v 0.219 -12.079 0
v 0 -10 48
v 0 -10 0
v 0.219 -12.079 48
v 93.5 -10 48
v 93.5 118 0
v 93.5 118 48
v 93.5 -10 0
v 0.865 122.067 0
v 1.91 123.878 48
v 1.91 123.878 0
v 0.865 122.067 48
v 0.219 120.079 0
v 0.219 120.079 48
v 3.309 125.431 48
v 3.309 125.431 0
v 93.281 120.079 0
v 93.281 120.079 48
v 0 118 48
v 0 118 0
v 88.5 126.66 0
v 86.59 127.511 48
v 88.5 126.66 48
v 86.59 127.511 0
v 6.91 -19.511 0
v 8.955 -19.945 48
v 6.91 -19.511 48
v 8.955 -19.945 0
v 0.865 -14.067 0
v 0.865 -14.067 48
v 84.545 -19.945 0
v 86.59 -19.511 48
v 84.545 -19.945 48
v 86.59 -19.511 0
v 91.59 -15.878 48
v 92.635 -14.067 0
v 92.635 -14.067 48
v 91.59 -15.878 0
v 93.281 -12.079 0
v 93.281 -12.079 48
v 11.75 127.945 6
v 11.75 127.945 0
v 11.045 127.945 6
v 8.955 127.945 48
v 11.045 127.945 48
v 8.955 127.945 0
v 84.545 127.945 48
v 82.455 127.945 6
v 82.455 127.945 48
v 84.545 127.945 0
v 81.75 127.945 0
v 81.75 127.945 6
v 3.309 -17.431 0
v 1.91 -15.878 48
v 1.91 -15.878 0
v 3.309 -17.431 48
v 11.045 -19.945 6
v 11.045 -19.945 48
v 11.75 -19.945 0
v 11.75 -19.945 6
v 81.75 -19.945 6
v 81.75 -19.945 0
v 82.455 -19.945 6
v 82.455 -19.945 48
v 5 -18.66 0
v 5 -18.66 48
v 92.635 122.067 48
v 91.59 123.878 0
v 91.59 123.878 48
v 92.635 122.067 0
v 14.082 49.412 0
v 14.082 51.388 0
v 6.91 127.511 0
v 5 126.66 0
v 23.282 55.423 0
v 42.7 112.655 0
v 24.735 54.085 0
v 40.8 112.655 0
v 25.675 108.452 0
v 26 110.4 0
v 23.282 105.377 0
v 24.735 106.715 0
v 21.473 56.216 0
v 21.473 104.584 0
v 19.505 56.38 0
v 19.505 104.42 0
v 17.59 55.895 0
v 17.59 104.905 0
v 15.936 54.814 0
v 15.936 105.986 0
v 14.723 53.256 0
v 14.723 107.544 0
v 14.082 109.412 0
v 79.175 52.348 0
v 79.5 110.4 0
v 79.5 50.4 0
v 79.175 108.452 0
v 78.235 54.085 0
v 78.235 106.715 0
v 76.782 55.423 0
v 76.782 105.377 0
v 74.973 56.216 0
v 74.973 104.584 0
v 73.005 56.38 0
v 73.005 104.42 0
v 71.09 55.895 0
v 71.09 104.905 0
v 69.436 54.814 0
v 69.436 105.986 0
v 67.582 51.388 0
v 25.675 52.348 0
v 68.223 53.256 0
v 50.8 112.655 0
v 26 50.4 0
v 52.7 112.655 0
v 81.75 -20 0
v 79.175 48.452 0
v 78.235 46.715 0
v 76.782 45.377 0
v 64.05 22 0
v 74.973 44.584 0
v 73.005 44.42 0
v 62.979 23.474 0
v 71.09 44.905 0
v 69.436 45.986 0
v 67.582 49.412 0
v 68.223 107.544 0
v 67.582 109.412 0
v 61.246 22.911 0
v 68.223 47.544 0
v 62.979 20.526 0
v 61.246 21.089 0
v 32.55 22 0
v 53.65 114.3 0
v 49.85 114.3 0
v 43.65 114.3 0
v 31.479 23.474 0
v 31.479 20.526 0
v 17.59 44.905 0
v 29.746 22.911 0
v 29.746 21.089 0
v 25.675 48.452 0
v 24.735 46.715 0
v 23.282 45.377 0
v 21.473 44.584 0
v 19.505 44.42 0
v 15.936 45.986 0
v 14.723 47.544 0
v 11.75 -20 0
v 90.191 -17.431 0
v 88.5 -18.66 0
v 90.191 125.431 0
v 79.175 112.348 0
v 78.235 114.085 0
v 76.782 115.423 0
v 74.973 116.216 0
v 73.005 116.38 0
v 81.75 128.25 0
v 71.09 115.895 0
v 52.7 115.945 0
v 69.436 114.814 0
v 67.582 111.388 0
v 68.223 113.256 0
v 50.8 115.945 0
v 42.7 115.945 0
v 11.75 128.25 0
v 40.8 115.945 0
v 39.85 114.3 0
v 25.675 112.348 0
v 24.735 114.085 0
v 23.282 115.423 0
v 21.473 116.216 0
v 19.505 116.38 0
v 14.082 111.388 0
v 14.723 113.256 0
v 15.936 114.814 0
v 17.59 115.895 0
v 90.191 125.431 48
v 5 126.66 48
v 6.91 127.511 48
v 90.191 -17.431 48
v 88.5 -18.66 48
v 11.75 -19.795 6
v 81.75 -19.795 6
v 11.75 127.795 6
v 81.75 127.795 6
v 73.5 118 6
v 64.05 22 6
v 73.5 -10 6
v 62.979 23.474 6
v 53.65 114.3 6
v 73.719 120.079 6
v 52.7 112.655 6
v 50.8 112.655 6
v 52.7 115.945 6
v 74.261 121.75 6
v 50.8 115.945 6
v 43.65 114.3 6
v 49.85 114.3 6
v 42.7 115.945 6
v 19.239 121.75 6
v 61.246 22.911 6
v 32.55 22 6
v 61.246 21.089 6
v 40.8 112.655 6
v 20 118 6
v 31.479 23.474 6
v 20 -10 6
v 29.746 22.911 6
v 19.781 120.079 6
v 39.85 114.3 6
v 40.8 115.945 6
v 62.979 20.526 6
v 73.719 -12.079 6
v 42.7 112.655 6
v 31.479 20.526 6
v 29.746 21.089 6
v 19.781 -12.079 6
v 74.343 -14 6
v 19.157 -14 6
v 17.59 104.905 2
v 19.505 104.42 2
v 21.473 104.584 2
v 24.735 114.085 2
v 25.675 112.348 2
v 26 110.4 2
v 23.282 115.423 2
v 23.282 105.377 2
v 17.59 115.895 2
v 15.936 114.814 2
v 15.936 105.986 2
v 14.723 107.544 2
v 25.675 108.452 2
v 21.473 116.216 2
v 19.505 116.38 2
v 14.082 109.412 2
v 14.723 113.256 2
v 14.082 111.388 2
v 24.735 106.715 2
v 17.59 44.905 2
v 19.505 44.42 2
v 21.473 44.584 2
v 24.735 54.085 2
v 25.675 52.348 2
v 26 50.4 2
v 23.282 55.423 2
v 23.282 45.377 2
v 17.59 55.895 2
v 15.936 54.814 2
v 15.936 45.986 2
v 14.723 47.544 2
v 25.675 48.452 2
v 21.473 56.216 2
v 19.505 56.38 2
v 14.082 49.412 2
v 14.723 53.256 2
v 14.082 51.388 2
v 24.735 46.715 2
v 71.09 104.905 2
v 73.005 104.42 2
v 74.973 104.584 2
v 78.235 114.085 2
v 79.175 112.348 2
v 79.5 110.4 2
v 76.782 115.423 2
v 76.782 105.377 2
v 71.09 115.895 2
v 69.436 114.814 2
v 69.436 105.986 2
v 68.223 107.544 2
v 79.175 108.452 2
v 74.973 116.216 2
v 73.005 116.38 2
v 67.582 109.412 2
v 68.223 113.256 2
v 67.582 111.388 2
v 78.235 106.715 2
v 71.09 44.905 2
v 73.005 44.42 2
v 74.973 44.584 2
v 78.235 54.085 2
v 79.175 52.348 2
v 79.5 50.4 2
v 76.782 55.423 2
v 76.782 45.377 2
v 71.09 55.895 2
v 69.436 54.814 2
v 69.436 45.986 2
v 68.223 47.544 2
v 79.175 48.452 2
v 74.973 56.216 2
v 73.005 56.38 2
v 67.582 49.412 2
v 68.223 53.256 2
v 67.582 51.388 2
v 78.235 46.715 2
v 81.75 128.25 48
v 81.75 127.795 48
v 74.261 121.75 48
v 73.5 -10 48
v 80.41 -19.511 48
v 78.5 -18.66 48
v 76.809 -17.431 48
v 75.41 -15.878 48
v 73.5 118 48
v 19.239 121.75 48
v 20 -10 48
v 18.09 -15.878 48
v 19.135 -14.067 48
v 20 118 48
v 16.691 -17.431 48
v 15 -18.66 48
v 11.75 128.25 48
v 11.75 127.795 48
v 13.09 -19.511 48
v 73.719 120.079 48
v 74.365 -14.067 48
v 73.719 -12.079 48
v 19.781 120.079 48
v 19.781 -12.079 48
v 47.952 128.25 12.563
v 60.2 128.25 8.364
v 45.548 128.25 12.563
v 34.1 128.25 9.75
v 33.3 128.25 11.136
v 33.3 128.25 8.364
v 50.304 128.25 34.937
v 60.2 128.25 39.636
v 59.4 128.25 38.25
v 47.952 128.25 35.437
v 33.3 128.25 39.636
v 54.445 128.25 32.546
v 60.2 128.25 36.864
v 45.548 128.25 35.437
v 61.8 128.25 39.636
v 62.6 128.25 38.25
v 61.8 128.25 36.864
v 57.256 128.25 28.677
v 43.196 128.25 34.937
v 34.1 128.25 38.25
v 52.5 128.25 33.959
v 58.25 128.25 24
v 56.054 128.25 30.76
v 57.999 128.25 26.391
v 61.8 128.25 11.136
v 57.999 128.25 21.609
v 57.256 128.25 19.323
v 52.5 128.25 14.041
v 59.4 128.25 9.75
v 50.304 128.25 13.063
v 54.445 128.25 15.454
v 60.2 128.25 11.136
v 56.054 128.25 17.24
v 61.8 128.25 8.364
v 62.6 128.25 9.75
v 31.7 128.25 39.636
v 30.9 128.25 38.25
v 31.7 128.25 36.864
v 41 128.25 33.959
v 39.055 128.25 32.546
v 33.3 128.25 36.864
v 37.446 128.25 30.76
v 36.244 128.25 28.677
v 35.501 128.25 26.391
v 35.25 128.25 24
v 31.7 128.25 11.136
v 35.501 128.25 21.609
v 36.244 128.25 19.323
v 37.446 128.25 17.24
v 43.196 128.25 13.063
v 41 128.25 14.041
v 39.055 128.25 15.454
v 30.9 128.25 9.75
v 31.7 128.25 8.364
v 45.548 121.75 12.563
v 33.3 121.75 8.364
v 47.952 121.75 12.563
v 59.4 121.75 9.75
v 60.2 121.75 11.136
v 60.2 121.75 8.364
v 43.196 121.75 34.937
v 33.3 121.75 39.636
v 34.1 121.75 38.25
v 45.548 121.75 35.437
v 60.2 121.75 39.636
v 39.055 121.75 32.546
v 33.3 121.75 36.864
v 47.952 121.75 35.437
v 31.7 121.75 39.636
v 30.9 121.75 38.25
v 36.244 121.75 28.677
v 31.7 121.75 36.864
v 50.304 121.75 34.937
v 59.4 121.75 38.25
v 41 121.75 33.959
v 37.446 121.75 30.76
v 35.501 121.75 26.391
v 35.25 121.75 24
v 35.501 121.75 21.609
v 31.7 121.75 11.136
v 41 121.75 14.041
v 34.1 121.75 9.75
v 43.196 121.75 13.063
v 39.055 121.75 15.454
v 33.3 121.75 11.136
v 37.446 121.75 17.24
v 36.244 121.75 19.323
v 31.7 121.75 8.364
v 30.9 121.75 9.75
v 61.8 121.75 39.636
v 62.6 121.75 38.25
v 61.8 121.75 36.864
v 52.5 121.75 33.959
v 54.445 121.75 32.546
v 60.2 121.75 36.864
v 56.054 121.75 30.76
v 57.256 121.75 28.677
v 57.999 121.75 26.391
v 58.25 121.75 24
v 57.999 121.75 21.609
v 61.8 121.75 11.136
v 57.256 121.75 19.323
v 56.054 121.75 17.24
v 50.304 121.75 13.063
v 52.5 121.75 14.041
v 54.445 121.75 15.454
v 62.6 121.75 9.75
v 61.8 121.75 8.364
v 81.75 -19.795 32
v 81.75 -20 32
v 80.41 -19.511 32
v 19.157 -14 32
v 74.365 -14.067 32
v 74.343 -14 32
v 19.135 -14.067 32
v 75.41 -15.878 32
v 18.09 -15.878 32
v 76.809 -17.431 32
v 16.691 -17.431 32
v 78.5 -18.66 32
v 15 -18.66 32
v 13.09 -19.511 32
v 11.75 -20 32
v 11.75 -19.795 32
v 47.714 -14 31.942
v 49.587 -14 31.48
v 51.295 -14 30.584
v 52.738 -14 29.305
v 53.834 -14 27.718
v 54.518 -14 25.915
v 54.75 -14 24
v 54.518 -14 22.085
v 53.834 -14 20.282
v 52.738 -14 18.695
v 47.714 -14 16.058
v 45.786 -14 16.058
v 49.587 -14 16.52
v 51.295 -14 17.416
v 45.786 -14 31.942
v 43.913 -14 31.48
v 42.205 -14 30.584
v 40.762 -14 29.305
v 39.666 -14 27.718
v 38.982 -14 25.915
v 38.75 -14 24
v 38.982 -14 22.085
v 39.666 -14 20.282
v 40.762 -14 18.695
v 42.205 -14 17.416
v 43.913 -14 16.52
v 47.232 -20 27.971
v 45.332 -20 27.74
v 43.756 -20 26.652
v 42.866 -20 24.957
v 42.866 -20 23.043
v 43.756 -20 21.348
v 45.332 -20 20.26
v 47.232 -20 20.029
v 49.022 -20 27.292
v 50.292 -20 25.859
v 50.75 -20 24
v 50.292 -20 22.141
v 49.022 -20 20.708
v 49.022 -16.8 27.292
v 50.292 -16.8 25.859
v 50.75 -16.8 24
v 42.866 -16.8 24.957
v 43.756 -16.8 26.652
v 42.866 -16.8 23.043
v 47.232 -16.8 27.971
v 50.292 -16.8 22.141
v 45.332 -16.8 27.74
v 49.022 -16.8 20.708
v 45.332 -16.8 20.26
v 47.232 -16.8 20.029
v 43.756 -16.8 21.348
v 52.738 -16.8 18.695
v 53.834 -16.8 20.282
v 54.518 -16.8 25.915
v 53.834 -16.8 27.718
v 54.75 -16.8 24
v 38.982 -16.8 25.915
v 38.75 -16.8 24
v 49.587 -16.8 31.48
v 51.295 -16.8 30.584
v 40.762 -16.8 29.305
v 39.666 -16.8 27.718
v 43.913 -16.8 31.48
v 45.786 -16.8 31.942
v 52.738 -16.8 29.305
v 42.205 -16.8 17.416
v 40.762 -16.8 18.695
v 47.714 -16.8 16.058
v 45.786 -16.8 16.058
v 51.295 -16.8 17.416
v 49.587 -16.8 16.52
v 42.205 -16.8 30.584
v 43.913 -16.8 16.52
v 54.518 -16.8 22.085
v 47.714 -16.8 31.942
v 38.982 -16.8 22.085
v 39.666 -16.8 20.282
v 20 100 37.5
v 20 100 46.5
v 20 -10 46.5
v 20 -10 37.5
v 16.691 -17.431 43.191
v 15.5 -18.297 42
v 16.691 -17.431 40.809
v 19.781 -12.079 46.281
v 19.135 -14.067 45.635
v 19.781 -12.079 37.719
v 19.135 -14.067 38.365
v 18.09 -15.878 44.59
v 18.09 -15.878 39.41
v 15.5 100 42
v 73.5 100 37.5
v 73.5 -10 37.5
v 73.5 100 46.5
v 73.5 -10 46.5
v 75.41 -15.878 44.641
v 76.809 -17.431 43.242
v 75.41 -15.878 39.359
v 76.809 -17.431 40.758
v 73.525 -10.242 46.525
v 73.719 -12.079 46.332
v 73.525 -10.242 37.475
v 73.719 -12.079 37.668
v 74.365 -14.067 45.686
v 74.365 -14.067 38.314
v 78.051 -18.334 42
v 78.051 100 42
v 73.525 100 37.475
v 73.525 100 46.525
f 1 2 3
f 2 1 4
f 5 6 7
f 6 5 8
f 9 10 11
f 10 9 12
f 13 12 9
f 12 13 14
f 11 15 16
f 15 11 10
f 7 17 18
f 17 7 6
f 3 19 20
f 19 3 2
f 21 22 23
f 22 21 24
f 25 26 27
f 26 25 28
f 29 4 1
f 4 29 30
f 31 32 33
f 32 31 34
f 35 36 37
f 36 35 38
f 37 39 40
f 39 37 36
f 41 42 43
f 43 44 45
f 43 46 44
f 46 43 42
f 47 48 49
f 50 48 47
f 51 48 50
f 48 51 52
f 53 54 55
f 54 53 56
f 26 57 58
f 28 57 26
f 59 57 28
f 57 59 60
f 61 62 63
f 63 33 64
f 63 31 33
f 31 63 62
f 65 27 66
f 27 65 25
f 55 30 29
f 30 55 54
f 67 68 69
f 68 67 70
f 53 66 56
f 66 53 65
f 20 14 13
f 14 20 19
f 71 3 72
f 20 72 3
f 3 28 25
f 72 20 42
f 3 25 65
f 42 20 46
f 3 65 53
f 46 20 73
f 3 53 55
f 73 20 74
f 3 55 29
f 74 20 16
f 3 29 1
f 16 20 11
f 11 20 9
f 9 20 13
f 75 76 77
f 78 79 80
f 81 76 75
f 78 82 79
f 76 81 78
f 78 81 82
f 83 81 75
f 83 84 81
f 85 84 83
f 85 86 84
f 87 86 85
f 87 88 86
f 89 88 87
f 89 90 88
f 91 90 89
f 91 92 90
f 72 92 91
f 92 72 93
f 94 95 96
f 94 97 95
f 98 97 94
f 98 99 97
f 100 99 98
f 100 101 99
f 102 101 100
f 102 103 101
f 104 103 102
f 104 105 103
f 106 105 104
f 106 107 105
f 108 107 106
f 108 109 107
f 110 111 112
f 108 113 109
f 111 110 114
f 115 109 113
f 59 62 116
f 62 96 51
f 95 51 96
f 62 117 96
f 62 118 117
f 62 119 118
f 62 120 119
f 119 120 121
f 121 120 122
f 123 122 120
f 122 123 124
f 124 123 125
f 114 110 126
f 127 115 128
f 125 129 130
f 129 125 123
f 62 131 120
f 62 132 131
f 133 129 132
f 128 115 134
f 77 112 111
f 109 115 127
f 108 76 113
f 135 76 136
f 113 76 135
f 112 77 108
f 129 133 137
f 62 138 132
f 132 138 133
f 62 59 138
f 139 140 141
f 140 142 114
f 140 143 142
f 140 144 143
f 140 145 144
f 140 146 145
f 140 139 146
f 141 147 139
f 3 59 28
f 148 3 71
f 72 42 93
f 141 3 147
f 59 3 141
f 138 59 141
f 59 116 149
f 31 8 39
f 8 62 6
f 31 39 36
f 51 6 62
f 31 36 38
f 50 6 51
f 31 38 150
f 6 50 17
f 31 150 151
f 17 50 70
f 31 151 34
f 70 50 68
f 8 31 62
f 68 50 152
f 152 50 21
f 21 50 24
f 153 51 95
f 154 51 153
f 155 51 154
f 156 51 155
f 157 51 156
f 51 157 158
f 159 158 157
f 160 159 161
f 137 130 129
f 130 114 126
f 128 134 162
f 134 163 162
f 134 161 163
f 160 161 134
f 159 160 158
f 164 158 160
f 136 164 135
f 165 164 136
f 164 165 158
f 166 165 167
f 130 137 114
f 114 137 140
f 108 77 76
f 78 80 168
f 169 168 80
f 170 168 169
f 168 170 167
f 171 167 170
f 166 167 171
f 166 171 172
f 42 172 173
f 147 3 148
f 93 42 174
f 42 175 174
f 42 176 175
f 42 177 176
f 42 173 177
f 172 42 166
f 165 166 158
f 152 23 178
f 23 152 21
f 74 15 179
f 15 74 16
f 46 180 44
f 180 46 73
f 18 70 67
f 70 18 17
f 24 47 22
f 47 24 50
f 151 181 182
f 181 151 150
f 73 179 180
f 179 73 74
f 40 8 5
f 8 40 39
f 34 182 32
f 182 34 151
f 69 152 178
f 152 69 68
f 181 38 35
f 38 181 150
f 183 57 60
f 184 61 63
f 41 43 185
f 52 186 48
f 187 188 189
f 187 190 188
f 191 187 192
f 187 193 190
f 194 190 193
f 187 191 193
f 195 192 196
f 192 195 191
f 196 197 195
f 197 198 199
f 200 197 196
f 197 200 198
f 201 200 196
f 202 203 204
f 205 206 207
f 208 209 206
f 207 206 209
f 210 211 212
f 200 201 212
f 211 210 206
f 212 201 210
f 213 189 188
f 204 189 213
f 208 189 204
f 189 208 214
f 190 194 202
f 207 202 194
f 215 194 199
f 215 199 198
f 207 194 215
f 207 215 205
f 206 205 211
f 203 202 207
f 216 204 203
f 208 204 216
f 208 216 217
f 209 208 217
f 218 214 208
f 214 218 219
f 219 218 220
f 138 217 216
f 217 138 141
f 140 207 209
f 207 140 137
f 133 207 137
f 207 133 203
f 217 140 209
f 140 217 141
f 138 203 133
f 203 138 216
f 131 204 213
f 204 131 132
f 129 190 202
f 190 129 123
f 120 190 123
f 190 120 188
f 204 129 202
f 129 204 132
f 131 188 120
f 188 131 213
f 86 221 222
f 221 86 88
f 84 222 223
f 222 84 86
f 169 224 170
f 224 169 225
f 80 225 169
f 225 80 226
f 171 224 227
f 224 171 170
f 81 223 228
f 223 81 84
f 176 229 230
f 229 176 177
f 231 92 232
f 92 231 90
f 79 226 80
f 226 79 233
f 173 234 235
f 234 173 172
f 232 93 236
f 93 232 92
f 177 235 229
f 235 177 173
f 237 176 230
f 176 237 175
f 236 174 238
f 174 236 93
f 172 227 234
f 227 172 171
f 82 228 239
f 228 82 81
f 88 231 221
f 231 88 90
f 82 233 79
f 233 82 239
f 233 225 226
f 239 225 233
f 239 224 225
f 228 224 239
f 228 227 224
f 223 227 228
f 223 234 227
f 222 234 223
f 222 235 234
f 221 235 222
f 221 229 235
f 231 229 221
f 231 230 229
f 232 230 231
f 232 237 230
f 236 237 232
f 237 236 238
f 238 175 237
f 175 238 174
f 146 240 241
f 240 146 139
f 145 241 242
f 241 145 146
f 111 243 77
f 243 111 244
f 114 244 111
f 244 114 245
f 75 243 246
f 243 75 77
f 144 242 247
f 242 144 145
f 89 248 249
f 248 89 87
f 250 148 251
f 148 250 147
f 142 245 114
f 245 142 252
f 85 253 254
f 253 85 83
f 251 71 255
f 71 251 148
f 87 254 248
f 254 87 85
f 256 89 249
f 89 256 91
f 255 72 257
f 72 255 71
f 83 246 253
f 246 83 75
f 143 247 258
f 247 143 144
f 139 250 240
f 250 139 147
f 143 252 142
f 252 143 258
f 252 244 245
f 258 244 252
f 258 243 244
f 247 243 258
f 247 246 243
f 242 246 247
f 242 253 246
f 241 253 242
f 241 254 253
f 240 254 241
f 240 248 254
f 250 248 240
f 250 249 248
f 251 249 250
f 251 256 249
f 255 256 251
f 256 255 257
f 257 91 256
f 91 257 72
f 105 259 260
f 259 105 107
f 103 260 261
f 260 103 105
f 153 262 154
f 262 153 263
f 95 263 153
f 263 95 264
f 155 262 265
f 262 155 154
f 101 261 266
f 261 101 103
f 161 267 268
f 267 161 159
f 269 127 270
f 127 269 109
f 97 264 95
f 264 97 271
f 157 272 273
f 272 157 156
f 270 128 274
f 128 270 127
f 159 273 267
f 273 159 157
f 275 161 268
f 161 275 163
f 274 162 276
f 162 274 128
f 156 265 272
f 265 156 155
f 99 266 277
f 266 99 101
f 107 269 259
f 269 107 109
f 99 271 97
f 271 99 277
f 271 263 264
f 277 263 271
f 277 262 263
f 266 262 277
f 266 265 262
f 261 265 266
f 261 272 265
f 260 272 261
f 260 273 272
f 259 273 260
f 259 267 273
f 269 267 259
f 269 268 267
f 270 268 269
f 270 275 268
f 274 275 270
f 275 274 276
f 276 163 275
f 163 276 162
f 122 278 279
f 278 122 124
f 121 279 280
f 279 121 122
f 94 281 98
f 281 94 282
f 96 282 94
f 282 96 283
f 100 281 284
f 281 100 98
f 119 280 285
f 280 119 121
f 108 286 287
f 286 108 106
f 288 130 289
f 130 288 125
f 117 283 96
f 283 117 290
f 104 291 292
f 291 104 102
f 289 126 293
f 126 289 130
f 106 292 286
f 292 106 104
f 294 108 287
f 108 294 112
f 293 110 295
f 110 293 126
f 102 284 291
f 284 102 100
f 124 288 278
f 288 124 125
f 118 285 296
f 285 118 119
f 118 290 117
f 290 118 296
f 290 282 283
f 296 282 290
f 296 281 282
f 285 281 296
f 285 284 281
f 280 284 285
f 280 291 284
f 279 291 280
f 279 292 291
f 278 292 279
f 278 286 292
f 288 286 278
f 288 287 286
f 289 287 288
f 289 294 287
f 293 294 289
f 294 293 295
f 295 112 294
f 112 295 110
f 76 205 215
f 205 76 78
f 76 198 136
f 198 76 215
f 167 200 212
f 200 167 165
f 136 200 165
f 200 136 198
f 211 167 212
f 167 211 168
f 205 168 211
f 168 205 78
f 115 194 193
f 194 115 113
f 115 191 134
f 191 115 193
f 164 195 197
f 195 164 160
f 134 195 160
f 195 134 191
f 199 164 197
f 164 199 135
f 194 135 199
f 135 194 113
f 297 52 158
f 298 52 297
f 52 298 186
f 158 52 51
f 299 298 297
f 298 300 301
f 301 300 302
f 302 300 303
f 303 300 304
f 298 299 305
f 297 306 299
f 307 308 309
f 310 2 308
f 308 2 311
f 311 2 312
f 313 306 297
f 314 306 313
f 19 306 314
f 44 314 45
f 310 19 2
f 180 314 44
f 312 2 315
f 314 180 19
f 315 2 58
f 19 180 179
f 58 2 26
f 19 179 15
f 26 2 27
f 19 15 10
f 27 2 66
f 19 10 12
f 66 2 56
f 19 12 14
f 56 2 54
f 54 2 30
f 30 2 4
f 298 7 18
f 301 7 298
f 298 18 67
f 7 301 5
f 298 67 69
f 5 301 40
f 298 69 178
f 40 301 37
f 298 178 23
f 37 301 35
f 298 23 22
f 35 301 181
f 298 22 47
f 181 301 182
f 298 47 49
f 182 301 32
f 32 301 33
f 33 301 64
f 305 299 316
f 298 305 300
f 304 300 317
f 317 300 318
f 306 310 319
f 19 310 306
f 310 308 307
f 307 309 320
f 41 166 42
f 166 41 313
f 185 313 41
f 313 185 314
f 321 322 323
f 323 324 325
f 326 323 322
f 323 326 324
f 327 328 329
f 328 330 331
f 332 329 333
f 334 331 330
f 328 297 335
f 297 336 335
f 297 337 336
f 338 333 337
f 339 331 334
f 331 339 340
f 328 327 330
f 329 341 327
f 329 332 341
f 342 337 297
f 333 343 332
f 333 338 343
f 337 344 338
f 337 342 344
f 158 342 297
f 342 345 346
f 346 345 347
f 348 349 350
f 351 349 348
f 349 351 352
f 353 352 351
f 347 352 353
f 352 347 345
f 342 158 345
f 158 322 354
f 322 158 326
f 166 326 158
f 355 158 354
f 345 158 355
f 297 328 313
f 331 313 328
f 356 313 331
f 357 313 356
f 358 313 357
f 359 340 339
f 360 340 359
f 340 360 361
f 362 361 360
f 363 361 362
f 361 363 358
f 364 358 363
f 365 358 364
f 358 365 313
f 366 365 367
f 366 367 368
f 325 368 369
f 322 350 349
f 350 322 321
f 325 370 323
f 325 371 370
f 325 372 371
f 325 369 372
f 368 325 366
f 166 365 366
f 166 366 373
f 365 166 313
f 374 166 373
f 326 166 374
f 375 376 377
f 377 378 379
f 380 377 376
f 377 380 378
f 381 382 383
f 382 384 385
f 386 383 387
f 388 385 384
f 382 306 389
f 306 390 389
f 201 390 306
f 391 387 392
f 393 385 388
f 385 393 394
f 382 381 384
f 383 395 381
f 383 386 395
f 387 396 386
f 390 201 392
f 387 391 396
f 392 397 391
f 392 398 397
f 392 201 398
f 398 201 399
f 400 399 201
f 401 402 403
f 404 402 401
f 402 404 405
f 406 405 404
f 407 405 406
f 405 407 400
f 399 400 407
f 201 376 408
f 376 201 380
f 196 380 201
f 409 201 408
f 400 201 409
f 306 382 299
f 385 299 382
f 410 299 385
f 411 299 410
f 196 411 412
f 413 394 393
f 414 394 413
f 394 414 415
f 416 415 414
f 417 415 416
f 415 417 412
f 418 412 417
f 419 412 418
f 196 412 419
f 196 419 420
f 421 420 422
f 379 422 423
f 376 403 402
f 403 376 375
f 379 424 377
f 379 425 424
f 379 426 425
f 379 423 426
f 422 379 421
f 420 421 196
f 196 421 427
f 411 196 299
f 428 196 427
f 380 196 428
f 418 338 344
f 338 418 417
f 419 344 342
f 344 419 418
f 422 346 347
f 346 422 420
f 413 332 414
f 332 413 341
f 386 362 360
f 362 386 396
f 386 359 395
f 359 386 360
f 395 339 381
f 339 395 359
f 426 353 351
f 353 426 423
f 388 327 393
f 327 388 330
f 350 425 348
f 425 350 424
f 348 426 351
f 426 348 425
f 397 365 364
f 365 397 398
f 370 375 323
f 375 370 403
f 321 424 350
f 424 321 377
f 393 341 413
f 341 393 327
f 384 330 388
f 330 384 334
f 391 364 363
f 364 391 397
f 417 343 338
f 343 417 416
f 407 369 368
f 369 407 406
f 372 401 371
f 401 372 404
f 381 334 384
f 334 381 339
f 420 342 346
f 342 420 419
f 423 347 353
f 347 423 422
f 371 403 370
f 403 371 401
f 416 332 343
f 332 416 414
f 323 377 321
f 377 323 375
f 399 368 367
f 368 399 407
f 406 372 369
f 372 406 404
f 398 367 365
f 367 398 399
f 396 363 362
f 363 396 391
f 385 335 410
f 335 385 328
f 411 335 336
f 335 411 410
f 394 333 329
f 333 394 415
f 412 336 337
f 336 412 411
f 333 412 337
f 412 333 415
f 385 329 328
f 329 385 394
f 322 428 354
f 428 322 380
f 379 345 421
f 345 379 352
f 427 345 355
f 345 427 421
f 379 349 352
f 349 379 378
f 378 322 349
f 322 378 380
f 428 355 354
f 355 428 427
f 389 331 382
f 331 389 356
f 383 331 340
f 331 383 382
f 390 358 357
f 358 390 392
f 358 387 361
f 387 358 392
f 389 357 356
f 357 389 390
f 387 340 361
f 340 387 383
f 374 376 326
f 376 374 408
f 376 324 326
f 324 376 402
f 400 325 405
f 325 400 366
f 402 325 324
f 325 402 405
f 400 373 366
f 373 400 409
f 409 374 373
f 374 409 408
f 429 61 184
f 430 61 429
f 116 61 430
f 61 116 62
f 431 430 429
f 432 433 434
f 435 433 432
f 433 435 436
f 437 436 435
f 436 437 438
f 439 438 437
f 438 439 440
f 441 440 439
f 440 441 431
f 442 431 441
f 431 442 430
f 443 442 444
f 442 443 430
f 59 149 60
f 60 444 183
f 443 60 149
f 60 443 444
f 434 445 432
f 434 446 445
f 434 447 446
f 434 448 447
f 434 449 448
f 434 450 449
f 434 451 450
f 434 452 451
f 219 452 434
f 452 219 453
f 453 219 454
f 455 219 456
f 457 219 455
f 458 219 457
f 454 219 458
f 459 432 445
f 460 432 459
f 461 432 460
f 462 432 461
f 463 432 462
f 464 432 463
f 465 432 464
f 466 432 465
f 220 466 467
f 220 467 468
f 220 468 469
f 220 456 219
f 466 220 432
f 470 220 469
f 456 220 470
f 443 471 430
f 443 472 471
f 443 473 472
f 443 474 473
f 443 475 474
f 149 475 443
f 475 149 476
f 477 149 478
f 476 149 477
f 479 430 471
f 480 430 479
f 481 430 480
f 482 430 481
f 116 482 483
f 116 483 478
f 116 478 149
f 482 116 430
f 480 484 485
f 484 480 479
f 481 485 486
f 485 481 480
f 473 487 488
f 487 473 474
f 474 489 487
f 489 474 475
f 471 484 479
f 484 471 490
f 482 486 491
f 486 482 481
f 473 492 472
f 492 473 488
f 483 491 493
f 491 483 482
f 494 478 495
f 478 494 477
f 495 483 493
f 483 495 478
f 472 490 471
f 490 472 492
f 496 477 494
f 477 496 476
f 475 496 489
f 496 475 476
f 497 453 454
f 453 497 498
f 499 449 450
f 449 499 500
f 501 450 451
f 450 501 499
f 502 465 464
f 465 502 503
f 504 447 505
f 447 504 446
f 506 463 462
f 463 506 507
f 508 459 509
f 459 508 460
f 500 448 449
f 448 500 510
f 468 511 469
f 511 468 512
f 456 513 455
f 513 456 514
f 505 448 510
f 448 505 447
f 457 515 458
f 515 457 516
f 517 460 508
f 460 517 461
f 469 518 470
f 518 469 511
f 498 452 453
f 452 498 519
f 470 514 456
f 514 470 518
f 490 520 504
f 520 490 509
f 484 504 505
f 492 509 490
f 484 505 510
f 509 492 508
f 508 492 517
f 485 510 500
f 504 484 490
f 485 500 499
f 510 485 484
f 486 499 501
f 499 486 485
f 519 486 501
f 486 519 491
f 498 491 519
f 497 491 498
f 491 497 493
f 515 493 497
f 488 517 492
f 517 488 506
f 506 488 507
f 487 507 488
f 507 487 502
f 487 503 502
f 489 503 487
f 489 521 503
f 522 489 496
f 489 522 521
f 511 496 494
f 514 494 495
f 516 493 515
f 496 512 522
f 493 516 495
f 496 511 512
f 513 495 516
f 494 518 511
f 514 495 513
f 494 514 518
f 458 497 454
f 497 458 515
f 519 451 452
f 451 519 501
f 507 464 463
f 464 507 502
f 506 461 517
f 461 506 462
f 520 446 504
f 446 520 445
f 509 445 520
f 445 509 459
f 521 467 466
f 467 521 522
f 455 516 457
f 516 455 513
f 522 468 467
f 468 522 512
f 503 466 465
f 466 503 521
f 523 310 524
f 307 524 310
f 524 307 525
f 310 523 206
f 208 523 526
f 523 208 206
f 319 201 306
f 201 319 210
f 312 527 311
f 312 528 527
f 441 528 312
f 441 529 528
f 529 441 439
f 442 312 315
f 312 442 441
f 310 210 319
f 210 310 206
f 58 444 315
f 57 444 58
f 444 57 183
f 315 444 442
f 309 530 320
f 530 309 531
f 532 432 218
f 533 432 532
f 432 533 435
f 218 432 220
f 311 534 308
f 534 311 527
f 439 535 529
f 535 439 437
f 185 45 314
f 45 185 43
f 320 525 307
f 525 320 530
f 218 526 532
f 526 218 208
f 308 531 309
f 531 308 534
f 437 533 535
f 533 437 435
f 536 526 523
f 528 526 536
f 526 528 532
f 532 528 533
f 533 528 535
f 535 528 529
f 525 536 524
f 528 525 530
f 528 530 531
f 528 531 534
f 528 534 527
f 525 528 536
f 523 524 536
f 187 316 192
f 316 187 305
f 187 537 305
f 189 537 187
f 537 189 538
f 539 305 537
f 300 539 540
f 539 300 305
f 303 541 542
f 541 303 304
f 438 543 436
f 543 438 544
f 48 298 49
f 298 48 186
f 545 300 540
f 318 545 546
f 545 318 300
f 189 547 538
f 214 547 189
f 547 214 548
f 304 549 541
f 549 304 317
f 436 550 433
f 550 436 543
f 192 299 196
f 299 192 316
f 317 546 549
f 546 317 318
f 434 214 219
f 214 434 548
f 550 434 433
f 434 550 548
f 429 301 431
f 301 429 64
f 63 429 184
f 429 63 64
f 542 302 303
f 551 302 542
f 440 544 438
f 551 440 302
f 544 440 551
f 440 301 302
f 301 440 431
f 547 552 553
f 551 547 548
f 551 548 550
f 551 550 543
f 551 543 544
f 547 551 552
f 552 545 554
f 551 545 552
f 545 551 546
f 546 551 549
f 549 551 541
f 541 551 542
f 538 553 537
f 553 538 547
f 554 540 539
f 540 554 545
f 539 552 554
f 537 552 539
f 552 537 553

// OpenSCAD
module roundedcube(x,y,z,r){
 hull(){
  translate([r/2,r/2,0]) cylinder(h=z,d=r);
  translate([-(r/2)+x,r/2,0]) cylinder(h=z,d=r);
  translate([(r/2),-(r/2)+y,0]) cylinder(h=z,d=r);
  translate([-(r/2)+x,-(r/2)+y,0]) cylinder(h=z,d=r);
 }
}

difference(){
translate([0,-20,0])
roundedcube(93.5, 142+6, 6, 20);

translate([29.5+1.5,20.5+1.5,-1])
cylinder(r=1.55,h=10);
translate([93.5-(29.5+1.5),20.5+1.5,-1])
cylinder(r=1.55,h=10);

translate([24.5-4.5,122-(16.1-4.5),-1])
cylinder(r=6,h=3);
translate([24.5-4.5,122-(76.1-4.5),-1])
cylinder(r=6,h=3);
translate([93.5-(24.5-4.5),122-(16.1-4.5),-1])
cylinder(r=6,h=3);
translate([93.5-(24.5-4.5),122-(76.1-4.5),-1])
cylinder(r=6,h=3);

translate([93.5/2-(3.1+1.9),122-(9.6-1.9),-1])
cylinder(r=1.9,h=10);
translate([93.5/2+(3.1+1.9),122-(9.6-1.9),-1])
cylinder(r=1.9,h=10);
}
translate([93.5/2, 122+3, 24]) {
difference(){
cube([70, 6.5, 48], center=true);
translate([0,8,0])
rotate([90,0,0])
cylinder(r=23/2,h=16);
translate([14.25,8,14.25])
rotate([90,0,0])
cylinder(r=1.6,h=16);
translate([14.25,8,-14.25])
rotate([90,0,0])
cylinder(r=1.6,h=16);
translate([-14.25,8,14.25])
rotate([90,0,0])
cylinder(r=1.6,h=16);
translate([-14.25,8,-14.25])
rotate([90,0,0])
cylinder(r=1.6,h=16);
}}
difference(){
translate([93.5/2, -20+3, 16])
cube([70, 6, 32], center=true);
translate([93.5/2, -20+3, 24])
translate([0,8,0])
rotate([90,0,0])
cylinder(r=4,h=16);
translate([93.5/2, -20+3, 24])
translate([0,3.2,0])
rotate([90,0,0])
cylinder(r=8,h=3);
}
difference(){
hull(){
translate([10,-10,5]) cylinder(r=10,h=43);
translate([10,118,5]) cylinder(r=10,h=43);
}
translate([20-4.5,-20,42])
rotate([0,45,0])
cube([6.4,120,6.4]);
}
difference(){
hull(){
translate([93.5-10,-10,5]) cylinder(r=10,h=43);
translate([93.5-10,118,5]) cylinder(r=10,h=43);
}
translate([93.5-20-4.5,-20,42])
rotate([0,45,0])
cube([6.4,120,6.4]);
}
